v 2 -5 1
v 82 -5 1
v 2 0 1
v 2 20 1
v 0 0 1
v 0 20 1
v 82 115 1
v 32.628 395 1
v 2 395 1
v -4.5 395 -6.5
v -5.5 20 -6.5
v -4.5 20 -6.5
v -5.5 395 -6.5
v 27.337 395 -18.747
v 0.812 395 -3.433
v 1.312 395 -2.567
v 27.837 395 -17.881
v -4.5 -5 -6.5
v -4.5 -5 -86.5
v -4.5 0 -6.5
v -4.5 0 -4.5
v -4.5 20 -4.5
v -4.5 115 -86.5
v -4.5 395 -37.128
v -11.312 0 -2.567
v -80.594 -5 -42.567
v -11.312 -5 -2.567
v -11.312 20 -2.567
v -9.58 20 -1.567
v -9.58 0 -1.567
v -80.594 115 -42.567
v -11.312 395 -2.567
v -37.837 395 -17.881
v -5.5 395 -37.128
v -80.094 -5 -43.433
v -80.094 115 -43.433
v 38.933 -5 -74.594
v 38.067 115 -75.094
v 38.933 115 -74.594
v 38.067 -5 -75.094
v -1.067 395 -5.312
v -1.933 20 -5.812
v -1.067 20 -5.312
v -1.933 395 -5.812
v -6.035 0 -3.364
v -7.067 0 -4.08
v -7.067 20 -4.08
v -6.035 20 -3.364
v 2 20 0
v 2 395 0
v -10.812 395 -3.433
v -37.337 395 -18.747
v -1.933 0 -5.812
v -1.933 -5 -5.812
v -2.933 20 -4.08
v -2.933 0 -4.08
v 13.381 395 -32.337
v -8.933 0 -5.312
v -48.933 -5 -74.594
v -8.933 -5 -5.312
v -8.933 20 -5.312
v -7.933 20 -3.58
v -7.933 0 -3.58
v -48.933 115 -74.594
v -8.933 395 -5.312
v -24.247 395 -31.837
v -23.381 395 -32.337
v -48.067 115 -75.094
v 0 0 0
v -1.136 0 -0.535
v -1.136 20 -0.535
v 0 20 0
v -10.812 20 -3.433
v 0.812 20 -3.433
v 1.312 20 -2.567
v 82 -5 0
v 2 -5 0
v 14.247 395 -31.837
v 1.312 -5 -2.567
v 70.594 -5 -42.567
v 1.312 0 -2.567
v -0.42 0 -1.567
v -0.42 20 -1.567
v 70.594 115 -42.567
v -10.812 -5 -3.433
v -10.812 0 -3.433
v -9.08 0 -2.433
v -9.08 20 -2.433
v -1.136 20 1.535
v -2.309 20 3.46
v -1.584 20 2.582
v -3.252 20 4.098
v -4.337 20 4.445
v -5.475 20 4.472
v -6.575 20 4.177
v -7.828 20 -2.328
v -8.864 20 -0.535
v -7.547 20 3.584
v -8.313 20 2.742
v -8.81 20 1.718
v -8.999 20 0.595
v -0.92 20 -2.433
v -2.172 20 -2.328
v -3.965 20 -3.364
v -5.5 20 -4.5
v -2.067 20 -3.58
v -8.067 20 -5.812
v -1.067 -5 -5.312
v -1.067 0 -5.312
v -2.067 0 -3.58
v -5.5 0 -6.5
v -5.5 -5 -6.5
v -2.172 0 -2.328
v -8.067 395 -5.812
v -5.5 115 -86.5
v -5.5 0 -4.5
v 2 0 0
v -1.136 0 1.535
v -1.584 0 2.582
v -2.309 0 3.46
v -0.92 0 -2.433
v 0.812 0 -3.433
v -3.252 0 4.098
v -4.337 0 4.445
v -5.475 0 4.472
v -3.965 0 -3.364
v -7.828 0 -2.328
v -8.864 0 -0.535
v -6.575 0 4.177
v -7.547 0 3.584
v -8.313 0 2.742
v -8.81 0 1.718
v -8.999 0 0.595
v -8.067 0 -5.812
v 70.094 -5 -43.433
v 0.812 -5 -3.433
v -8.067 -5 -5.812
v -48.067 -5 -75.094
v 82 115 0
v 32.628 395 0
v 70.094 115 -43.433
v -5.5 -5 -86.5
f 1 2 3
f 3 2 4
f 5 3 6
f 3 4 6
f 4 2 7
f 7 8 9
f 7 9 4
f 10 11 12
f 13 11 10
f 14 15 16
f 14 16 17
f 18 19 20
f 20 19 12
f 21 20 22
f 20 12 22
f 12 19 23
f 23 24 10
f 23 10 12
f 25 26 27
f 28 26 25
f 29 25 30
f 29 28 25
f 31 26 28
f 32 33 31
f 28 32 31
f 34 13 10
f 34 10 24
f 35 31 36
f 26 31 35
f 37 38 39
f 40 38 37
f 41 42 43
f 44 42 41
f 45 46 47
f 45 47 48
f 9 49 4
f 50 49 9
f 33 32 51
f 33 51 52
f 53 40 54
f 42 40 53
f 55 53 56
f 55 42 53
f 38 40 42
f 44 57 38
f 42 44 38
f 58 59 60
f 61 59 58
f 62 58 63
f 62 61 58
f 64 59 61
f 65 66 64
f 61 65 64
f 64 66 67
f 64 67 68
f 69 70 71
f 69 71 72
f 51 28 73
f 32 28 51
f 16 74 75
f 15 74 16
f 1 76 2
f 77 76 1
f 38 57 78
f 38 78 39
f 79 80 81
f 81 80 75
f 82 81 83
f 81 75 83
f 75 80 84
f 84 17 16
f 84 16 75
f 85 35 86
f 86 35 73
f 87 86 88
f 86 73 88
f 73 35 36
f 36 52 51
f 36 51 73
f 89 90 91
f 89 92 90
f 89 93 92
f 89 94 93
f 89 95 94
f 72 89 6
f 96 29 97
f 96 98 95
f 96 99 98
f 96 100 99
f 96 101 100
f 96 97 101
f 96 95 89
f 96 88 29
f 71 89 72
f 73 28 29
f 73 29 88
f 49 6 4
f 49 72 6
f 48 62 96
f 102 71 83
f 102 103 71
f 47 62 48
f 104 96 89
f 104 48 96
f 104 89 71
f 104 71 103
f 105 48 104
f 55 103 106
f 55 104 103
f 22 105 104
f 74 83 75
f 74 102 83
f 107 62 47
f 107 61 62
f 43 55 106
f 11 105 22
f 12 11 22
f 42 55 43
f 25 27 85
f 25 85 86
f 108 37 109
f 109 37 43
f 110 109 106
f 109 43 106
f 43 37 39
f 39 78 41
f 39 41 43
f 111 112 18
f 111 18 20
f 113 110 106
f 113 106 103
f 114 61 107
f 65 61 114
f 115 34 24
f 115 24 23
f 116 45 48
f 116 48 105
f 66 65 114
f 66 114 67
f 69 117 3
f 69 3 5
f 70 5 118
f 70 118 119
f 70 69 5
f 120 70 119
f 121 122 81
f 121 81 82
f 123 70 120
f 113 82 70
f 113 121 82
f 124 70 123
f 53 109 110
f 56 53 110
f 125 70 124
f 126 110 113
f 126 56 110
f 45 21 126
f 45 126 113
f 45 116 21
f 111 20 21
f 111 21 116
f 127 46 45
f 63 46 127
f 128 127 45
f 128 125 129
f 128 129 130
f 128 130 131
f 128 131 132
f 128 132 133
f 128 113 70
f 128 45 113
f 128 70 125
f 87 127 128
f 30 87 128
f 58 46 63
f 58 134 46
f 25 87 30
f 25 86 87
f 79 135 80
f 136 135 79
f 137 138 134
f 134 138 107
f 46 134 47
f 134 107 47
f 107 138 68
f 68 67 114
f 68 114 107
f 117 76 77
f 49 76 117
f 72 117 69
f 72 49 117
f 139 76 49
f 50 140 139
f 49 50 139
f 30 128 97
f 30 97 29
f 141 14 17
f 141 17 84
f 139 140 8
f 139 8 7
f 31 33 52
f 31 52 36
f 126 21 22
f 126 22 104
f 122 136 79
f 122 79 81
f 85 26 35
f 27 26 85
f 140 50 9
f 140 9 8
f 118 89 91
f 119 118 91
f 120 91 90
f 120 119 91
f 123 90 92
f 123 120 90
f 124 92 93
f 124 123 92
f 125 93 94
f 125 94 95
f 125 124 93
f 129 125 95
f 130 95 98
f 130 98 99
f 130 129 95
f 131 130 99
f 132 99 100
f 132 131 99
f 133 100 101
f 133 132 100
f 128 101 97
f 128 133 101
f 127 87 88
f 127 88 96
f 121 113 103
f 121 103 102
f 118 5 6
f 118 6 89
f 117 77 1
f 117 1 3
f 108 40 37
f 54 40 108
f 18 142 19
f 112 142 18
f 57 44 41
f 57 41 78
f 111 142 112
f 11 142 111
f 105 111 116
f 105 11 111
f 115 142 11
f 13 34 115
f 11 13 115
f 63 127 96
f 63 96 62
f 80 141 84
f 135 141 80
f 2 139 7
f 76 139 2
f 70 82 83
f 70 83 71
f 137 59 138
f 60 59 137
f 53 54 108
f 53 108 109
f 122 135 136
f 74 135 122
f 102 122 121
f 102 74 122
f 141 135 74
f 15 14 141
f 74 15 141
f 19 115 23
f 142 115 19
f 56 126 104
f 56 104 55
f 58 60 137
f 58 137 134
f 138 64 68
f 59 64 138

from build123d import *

# Parameters (mm, degrees)
BOSS_EXTRUDE1_DEPTH = 1
BOSS_EXTRUDE2_START = -5
SKETCH2_R           = 4
BOSS_EXTRUDE2_DEPTH = 20
BOSS_EXTRUDE3_DEPTH = 20
CIRPATTERN1_COUNT   = 6
CIRPATTERN1_ANGLE   = 150
CIRPATTERN2_COUNT   = 7
CIRPATTERN2_ANGLE   = 180


with BuildPart() as part:
    # Sketch1 → Boss-Extrude1 (new body)
    with BuildSketch(Plane.XY):
        Polygon((0, 0), (0, 20), (2, 20), (2, 395), (32.628445402, 395), (82, 115), (82, -5), (2, -5), (2, 0), align=None)
    boss_extrude1 = extrude(amount=BOSS_EXTRUDE1_DEPTH)



with BuildPart() as body_2:
    # Sketch2 → Boss-Extrude2 (new body)
    with BuildSketch(Plane.XZ.offset(5).offset(BOSS_EXTRUDE2_START)):
        with Locations((-5, 0.5)):
            Circle(SKETCH2_R)
    extrude(amount=-BOSS_EXTRUDE2_DEPTH)


with BuildPart() as part_1:
    add(part.part)

    add(body_2.part)  # Boss-Extrude3 merges body 2
    # Sketch3 → Boss-Extrude3 (add)
    with BuildSketch(Plane.XZ):
        with BuildLine():
            Line((0, 1), (-1.136296695, 1.53527618))
            ThreePointArc((-1.136296695, 1.53527618), (-1, 0.5), (-1.136296695, -0.53527618))
            Line((-1.136296695, -0.53527618), (0, 0))
            Line((0, 0), (0, 1))
        make_face()
    boss_extrude3 = extrude(amount=-BOSS_EXTRUDE3_DEPTH)

    # CirPattern1: Boss-Extrude3 ×6 about axis
    cirpattern1_axis = Axis((-5, 0, 0.5), (0, 1, 0))
    for i in range(1, CIRPATTERN1_COUNT):
        add(boss_extrude3.rotate(cirpattern1_axis, i * CIRPATTERN1_ANGLE / (CIRPATTERN1_COUNT - 1)))

    # CirPattern2: Boss-Extrude1 ×7 about axis, 1 skipped
    cirpattern2_axis = Axis((-5, 0, 0.5), (0, 1, 0))
    add([boss_extrude1.rotate(cirpattern2_axis, i * CIRPATTERN2_ANGLE / (CIRPATTERN2_COUNT - 1)) for i in range(1, CIRPATTERN2_COUNT) if i not in (6,)])


solid = part_1.part
